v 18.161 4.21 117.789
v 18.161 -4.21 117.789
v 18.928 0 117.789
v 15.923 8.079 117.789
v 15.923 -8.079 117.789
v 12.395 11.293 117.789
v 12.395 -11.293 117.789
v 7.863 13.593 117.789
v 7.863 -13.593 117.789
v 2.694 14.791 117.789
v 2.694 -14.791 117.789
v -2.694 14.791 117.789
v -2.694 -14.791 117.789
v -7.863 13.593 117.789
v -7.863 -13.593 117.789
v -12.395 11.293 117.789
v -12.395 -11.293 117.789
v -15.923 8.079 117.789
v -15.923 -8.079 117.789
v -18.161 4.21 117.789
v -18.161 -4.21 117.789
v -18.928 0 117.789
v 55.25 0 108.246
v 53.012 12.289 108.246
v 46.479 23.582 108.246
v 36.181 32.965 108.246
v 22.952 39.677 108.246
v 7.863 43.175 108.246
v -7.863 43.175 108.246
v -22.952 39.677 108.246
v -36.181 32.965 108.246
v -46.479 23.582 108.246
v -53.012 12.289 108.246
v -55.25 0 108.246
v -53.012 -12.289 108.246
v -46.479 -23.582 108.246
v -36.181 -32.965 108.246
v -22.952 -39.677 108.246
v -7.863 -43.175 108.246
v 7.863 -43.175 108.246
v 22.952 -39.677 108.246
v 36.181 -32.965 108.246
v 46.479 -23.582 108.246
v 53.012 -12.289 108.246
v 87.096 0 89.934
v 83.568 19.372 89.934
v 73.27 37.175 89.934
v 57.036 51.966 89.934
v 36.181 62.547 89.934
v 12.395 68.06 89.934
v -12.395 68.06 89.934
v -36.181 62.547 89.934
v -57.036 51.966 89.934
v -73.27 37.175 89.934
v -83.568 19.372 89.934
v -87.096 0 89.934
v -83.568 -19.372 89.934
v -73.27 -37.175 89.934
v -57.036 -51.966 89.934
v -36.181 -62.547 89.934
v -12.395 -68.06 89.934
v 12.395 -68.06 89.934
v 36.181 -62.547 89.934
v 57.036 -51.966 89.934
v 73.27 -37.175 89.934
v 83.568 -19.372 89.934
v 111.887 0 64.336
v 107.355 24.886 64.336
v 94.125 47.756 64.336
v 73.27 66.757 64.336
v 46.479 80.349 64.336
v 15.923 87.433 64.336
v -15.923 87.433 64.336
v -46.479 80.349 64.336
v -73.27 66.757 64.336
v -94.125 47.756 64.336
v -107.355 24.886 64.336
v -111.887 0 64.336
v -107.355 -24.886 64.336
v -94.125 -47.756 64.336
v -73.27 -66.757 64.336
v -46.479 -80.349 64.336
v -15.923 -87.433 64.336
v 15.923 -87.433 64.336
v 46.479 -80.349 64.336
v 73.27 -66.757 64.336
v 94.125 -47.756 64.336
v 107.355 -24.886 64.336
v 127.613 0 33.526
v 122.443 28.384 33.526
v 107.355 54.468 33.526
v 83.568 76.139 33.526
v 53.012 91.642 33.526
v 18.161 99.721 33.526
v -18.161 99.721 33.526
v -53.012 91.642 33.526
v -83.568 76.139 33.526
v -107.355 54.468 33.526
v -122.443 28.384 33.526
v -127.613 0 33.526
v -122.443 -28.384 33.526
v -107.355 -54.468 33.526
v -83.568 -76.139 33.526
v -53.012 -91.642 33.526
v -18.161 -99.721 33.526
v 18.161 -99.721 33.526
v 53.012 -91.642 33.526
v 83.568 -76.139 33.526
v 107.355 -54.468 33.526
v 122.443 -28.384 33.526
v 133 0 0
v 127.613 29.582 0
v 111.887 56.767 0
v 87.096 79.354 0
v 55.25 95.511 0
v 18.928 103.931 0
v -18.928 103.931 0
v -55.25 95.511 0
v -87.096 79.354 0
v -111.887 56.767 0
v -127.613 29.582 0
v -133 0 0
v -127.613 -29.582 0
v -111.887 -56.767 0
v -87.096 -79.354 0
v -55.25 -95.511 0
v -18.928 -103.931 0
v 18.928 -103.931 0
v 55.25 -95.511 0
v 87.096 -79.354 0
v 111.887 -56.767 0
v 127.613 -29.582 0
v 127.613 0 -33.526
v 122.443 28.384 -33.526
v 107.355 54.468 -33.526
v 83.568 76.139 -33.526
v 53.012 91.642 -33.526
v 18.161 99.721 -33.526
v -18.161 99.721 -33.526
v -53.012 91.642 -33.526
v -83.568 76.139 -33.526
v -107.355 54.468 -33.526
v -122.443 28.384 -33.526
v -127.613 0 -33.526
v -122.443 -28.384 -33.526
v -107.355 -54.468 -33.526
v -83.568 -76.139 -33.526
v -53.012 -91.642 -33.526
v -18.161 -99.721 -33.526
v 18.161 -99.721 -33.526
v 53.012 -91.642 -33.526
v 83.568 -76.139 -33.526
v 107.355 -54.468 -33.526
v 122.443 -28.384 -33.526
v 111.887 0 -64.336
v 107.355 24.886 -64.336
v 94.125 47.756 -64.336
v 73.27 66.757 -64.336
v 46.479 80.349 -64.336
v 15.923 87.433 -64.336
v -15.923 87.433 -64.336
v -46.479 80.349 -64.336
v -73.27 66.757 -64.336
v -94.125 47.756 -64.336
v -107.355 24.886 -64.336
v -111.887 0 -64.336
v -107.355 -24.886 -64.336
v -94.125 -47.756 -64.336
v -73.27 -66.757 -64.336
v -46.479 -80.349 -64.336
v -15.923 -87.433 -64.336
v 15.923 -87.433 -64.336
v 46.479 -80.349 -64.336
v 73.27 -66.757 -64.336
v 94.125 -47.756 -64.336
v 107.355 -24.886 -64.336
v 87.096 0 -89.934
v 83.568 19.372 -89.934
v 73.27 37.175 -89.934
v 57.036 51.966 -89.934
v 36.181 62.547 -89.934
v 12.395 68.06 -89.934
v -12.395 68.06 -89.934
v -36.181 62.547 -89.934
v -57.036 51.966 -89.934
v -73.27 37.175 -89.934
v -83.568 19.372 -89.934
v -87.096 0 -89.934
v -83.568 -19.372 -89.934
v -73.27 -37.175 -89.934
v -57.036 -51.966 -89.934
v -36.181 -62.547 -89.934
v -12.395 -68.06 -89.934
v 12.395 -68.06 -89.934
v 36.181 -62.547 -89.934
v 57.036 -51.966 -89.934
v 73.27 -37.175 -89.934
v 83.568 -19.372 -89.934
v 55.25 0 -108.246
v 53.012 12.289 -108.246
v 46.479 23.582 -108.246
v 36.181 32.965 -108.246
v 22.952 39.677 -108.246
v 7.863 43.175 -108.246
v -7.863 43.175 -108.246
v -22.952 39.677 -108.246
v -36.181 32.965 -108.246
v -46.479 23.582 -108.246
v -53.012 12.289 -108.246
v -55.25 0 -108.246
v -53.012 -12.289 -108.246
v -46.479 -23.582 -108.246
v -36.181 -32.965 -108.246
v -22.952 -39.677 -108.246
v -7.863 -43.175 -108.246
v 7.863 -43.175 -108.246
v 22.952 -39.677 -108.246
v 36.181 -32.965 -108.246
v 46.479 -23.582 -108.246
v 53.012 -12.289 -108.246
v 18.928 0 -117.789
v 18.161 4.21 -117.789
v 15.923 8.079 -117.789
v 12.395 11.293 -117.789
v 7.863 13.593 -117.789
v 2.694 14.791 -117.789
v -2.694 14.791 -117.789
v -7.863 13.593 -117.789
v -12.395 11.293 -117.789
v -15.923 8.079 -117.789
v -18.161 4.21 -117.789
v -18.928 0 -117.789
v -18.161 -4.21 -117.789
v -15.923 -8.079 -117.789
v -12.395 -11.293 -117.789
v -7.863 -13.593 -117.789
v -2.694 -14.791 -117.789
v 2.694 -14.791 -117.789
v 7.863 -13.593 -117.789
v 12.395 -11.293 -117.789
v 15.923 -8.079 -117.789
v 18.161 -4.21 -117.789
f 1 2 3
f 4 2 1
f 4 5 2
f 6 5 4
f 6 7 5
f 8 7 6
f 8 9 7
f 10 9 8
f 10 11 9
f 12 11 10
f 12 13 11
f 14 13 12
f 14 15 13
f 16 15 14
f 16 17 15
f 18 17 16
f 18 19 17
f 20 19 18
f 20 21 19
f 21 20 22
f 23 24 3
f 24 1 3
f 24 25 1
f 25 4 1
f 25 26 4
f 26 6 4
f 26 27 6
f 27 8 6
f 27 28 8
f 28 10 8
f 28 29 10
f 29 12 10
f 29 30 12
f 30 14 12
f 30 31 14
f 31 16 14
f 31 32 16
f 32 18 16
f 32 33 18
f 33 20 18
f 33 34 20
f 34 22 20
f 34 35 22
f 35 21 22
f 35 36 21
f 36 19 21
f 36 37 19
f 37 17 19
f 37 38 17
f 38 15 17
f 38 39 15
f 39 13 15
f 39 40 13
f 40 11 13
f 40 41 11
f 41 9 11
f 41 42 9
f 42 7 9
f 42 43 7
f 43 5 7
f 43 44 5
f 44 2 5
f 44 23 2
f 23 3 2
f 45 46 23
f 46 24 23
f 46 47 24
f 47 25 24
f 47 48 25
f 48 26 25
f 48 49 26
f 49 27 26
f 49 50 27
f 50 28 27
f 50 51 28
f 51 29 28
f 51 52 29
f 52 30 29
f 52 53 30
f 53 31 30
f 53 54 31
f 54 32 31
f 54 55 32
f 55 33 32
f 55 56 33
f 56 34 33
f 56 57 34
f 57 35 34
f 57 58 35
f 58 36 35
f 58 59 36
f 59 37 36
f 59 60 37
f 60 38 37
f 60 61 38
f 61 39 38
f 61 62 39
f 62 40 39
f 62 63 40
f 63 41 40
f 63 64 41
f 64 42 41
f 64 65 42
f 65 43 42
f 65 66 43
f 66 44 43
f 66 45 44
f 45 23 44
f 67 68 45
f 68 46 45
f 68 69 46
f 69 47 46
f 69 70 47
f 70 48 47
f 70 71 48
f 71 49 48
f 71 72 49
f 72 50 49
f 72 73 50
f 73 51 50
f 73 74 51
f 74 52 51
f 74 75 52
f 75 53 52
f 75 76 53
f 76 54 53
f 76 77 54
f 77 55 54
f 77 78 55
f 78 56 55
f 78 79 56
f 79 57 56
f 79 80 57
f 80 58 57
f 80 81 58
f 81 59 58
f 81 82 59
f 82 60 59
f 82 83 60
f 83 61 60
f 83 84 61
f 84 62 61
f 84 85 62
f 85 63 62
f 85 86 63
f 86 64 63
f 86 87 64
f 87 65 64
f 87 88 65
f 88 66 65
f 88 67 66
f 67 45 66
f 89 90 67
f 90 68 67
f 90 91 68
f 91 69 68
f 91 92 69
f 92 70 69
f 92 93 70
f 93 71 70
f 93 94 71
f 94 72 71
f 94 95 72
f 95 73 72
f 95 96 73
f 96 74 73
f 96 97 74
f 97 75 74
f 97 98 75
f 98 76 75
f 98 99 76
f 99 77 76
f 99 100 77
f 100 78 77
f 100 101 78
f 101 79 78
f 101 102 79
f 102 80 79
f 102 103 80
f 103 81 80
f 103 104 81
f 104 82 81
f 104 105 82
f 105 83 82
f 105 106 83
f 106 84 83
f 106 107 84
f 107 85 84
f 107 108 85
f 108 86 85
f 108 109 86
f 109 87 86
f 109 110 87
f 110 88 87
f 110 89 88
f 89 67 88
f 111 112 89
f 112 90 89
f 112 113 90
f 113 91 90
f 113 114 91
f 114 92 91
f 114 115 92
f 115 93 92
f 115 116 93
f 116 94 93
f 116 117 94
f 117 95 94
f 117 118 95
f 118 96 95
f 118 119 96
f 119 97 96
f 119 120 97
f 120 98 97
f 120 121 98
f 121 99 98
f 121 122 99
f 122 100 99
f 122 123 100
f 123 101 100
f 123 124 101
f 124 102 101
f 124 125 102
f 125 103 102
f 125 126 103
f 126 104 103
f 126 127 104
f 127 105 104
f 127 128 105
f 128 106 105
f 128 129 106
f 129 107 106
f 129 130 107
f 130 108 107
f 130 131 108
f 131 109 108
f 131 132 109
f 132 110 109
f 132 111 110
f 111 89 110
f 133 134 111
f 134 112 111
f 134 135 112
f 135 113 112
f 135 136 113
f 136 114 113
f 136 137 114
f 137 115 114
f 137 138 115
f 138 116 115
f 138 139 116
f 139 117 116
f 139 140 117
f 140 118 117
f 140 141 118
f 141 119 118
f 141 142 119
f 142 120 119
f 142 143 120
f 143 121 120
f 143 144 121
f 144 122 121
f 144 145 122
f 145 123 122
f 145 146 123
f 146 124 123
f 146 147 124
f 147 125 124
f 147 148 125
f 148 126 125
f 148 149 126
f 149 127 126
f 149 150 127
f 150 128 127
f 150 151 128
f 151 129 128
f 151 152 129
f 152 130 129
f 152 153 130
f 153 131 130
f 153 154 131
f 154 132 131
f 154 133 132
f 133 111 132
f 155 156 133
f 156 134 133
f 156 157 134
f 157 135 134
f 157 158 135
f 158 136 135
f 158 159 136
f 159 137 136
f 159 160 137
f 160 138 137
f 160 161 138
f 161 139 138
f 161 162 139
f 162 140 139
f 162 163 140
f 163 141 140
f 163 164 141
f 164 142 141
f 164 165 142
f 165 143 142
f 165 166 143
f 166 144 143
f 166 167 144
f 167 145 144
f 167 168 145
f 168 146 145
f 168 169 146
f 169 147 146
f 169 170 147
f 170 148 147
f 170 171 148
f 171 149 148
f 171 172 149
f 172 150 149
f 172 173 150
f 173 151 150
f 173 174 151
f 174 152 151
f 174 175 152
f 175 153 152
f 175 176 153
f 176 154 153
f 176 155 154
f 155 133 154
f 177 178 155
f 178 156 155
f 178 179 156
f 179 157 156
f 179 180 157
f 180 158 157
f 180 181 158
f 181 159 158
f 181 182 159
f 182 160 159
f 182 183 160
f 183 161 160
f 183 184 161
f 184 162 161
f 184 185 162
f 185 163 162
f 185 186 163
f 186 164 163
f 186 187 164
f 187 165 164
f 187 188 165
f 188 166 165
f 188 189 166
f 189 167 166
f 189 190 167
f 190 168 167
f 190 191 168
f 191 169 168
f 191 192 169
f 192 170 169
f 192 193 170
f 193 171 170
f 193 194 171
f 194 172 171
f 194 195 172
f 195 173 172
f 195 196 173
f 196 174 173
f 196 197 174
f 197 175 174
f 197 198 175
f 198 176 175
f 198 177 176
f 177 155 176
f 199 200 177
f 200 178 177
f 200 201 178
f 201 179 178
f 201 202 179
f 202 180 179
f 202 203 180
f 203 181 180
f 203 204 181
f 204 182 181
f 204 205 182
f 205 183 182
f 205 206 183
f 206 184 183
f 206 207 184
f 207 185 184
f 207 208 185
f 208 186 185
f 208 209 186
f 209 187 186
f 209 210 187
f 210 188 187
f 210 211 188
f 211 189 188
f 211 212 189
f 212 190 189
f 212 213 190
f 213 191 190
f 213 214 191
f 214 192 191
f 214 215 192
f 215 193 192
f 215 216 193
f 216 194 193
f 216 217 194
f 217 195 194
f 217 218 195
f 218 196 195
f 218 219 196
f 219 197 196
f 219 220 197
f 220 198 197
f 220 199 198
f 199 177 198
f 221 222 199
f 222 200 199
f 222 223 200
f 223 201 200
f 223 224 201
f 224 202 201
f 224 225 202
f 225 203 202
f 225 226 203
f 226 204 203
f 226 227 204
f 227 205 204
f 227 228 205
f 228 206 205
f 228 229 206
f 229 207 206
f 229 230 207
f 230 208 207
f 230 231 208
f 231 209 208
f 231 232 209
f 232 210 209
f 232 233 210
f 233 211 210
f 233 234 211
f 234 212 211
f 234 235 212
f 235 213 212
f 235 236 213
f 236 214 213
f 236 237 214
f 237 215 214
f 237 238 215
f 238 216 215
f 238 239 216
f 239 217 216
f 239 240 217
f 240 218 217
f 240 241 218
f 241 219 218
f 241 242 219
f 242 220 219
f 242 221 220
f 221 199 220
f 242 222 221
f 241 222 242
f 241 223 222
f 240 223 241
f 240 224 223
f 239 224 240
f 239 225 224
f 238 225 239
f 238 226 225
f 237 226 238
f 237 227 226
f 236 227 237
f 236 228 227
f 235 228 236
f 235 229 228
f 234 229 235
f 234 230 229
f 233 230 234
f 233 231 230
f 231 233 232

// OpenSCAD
// Generated by SolidPython 1.0.1 on 2020-07-29 00:46:54


scale(v = [19, 15, 17]) {
	sphere(r = 7);
}
/***********************************************
*********      SolidPython code:      **********
************************************************
 
# import packages: SolidPython
from solid import *
from solid.utils import *
from itertools import chain, combinations, permutations


class Resize:

    def __init__(self, scad_file):
        self.scad_file = scad_file
        #self.scad_file = import_scad(scad_file)
        # cone/cylinder param:
        self.r1 = 0
        self.r2 = 0
        self.h = 0
        # rectangular prism param:
        self.w = 0
        self.l = 0
        # ellipse param:
        self.r = 0

    # import OpenScad code (file name corresponds to shape)


    # classify shape + parameters
    def assign(self, param1, param2, param3):
        if self.scad_file == 'cone.scad':
            self.r1 = param1
            self.r2 = param2
            self.h = param3
        elif self.scad_file == 'cylinder.scad':
            self.r1 = param1
            self.r2 = param2
            self.h = param3
        elif self.scad_file == 'rectangularPrism.scad':
            self.h = param1
            self.l = param2
            self.w = param3
        else:
            self.r = param1
            self.h = param2

    # resize parameters
    def iterate(self):
        x = range(3, 20, 2)
        i = 1
        if self.scad_file == 'cone.scad':
            tempList = list(permutations(x, 2))
            for temp in tempList:
                param1 = temp[0]
                param2 = temp[1]
                filepath = 'produced_scad_files/' + 'cone' + str(param1) + '_' + str(param2) + '_' + '.scad'
                scad_render_to_file(cylinder(h=param1, r1=param2, r2=0), filepath)

        elif self.scad_file == 'cylinder.scad':
            tempList = list(permutations(x, 3))
            for temp in tempList:
                param1 = temp[0]
                param2 = temp[1]
                filepath = 'produced_scad_files/' + 'cylinder' + str(param1) + '_' + str(param2) + '_' + '.scad'
                scad_render_to_file(cylinder(h=param1, r1=param2, r2=param2), filepath)

        elif self.scad_file == 'rectangularPrism.scad':
            tempList = list(permutations(x, 3))
            for temp in tempList:
                param1 = temp[0]
                param2 = temp[1]
                param3 = temp[2]
                filepath = 'produced_scad_files/' + 'rectangularPrism' + str(param1) + '_' + str(param2) + '_' + str(
                    param3) + '.scad'
                scad_render_to_file(cube(size=(param1, param2, param3)), filepath)

        elif self.scad_file == 'ellipse.scad':
            tempList = list(permutations(x, 4))
            for temp in tempList:
                param1 = temp[0]
                param2 = temp[1]
                param3 = temp[2]
                param4 = temp[3]
                filepath = 'produced_scad_files/' + 'ellipse' + str(param1) + '_' + str(param2) + '_' + str(param3) + '_' + str(param4) + '.scad'
                scad_render_to_file(scale([param1, param2, param3])(sphere(r=param4)), filepath)

    def render_to_scadfile(self):
        scad_render_to_file(scad, 'example.scad') 
 
************************************************/
